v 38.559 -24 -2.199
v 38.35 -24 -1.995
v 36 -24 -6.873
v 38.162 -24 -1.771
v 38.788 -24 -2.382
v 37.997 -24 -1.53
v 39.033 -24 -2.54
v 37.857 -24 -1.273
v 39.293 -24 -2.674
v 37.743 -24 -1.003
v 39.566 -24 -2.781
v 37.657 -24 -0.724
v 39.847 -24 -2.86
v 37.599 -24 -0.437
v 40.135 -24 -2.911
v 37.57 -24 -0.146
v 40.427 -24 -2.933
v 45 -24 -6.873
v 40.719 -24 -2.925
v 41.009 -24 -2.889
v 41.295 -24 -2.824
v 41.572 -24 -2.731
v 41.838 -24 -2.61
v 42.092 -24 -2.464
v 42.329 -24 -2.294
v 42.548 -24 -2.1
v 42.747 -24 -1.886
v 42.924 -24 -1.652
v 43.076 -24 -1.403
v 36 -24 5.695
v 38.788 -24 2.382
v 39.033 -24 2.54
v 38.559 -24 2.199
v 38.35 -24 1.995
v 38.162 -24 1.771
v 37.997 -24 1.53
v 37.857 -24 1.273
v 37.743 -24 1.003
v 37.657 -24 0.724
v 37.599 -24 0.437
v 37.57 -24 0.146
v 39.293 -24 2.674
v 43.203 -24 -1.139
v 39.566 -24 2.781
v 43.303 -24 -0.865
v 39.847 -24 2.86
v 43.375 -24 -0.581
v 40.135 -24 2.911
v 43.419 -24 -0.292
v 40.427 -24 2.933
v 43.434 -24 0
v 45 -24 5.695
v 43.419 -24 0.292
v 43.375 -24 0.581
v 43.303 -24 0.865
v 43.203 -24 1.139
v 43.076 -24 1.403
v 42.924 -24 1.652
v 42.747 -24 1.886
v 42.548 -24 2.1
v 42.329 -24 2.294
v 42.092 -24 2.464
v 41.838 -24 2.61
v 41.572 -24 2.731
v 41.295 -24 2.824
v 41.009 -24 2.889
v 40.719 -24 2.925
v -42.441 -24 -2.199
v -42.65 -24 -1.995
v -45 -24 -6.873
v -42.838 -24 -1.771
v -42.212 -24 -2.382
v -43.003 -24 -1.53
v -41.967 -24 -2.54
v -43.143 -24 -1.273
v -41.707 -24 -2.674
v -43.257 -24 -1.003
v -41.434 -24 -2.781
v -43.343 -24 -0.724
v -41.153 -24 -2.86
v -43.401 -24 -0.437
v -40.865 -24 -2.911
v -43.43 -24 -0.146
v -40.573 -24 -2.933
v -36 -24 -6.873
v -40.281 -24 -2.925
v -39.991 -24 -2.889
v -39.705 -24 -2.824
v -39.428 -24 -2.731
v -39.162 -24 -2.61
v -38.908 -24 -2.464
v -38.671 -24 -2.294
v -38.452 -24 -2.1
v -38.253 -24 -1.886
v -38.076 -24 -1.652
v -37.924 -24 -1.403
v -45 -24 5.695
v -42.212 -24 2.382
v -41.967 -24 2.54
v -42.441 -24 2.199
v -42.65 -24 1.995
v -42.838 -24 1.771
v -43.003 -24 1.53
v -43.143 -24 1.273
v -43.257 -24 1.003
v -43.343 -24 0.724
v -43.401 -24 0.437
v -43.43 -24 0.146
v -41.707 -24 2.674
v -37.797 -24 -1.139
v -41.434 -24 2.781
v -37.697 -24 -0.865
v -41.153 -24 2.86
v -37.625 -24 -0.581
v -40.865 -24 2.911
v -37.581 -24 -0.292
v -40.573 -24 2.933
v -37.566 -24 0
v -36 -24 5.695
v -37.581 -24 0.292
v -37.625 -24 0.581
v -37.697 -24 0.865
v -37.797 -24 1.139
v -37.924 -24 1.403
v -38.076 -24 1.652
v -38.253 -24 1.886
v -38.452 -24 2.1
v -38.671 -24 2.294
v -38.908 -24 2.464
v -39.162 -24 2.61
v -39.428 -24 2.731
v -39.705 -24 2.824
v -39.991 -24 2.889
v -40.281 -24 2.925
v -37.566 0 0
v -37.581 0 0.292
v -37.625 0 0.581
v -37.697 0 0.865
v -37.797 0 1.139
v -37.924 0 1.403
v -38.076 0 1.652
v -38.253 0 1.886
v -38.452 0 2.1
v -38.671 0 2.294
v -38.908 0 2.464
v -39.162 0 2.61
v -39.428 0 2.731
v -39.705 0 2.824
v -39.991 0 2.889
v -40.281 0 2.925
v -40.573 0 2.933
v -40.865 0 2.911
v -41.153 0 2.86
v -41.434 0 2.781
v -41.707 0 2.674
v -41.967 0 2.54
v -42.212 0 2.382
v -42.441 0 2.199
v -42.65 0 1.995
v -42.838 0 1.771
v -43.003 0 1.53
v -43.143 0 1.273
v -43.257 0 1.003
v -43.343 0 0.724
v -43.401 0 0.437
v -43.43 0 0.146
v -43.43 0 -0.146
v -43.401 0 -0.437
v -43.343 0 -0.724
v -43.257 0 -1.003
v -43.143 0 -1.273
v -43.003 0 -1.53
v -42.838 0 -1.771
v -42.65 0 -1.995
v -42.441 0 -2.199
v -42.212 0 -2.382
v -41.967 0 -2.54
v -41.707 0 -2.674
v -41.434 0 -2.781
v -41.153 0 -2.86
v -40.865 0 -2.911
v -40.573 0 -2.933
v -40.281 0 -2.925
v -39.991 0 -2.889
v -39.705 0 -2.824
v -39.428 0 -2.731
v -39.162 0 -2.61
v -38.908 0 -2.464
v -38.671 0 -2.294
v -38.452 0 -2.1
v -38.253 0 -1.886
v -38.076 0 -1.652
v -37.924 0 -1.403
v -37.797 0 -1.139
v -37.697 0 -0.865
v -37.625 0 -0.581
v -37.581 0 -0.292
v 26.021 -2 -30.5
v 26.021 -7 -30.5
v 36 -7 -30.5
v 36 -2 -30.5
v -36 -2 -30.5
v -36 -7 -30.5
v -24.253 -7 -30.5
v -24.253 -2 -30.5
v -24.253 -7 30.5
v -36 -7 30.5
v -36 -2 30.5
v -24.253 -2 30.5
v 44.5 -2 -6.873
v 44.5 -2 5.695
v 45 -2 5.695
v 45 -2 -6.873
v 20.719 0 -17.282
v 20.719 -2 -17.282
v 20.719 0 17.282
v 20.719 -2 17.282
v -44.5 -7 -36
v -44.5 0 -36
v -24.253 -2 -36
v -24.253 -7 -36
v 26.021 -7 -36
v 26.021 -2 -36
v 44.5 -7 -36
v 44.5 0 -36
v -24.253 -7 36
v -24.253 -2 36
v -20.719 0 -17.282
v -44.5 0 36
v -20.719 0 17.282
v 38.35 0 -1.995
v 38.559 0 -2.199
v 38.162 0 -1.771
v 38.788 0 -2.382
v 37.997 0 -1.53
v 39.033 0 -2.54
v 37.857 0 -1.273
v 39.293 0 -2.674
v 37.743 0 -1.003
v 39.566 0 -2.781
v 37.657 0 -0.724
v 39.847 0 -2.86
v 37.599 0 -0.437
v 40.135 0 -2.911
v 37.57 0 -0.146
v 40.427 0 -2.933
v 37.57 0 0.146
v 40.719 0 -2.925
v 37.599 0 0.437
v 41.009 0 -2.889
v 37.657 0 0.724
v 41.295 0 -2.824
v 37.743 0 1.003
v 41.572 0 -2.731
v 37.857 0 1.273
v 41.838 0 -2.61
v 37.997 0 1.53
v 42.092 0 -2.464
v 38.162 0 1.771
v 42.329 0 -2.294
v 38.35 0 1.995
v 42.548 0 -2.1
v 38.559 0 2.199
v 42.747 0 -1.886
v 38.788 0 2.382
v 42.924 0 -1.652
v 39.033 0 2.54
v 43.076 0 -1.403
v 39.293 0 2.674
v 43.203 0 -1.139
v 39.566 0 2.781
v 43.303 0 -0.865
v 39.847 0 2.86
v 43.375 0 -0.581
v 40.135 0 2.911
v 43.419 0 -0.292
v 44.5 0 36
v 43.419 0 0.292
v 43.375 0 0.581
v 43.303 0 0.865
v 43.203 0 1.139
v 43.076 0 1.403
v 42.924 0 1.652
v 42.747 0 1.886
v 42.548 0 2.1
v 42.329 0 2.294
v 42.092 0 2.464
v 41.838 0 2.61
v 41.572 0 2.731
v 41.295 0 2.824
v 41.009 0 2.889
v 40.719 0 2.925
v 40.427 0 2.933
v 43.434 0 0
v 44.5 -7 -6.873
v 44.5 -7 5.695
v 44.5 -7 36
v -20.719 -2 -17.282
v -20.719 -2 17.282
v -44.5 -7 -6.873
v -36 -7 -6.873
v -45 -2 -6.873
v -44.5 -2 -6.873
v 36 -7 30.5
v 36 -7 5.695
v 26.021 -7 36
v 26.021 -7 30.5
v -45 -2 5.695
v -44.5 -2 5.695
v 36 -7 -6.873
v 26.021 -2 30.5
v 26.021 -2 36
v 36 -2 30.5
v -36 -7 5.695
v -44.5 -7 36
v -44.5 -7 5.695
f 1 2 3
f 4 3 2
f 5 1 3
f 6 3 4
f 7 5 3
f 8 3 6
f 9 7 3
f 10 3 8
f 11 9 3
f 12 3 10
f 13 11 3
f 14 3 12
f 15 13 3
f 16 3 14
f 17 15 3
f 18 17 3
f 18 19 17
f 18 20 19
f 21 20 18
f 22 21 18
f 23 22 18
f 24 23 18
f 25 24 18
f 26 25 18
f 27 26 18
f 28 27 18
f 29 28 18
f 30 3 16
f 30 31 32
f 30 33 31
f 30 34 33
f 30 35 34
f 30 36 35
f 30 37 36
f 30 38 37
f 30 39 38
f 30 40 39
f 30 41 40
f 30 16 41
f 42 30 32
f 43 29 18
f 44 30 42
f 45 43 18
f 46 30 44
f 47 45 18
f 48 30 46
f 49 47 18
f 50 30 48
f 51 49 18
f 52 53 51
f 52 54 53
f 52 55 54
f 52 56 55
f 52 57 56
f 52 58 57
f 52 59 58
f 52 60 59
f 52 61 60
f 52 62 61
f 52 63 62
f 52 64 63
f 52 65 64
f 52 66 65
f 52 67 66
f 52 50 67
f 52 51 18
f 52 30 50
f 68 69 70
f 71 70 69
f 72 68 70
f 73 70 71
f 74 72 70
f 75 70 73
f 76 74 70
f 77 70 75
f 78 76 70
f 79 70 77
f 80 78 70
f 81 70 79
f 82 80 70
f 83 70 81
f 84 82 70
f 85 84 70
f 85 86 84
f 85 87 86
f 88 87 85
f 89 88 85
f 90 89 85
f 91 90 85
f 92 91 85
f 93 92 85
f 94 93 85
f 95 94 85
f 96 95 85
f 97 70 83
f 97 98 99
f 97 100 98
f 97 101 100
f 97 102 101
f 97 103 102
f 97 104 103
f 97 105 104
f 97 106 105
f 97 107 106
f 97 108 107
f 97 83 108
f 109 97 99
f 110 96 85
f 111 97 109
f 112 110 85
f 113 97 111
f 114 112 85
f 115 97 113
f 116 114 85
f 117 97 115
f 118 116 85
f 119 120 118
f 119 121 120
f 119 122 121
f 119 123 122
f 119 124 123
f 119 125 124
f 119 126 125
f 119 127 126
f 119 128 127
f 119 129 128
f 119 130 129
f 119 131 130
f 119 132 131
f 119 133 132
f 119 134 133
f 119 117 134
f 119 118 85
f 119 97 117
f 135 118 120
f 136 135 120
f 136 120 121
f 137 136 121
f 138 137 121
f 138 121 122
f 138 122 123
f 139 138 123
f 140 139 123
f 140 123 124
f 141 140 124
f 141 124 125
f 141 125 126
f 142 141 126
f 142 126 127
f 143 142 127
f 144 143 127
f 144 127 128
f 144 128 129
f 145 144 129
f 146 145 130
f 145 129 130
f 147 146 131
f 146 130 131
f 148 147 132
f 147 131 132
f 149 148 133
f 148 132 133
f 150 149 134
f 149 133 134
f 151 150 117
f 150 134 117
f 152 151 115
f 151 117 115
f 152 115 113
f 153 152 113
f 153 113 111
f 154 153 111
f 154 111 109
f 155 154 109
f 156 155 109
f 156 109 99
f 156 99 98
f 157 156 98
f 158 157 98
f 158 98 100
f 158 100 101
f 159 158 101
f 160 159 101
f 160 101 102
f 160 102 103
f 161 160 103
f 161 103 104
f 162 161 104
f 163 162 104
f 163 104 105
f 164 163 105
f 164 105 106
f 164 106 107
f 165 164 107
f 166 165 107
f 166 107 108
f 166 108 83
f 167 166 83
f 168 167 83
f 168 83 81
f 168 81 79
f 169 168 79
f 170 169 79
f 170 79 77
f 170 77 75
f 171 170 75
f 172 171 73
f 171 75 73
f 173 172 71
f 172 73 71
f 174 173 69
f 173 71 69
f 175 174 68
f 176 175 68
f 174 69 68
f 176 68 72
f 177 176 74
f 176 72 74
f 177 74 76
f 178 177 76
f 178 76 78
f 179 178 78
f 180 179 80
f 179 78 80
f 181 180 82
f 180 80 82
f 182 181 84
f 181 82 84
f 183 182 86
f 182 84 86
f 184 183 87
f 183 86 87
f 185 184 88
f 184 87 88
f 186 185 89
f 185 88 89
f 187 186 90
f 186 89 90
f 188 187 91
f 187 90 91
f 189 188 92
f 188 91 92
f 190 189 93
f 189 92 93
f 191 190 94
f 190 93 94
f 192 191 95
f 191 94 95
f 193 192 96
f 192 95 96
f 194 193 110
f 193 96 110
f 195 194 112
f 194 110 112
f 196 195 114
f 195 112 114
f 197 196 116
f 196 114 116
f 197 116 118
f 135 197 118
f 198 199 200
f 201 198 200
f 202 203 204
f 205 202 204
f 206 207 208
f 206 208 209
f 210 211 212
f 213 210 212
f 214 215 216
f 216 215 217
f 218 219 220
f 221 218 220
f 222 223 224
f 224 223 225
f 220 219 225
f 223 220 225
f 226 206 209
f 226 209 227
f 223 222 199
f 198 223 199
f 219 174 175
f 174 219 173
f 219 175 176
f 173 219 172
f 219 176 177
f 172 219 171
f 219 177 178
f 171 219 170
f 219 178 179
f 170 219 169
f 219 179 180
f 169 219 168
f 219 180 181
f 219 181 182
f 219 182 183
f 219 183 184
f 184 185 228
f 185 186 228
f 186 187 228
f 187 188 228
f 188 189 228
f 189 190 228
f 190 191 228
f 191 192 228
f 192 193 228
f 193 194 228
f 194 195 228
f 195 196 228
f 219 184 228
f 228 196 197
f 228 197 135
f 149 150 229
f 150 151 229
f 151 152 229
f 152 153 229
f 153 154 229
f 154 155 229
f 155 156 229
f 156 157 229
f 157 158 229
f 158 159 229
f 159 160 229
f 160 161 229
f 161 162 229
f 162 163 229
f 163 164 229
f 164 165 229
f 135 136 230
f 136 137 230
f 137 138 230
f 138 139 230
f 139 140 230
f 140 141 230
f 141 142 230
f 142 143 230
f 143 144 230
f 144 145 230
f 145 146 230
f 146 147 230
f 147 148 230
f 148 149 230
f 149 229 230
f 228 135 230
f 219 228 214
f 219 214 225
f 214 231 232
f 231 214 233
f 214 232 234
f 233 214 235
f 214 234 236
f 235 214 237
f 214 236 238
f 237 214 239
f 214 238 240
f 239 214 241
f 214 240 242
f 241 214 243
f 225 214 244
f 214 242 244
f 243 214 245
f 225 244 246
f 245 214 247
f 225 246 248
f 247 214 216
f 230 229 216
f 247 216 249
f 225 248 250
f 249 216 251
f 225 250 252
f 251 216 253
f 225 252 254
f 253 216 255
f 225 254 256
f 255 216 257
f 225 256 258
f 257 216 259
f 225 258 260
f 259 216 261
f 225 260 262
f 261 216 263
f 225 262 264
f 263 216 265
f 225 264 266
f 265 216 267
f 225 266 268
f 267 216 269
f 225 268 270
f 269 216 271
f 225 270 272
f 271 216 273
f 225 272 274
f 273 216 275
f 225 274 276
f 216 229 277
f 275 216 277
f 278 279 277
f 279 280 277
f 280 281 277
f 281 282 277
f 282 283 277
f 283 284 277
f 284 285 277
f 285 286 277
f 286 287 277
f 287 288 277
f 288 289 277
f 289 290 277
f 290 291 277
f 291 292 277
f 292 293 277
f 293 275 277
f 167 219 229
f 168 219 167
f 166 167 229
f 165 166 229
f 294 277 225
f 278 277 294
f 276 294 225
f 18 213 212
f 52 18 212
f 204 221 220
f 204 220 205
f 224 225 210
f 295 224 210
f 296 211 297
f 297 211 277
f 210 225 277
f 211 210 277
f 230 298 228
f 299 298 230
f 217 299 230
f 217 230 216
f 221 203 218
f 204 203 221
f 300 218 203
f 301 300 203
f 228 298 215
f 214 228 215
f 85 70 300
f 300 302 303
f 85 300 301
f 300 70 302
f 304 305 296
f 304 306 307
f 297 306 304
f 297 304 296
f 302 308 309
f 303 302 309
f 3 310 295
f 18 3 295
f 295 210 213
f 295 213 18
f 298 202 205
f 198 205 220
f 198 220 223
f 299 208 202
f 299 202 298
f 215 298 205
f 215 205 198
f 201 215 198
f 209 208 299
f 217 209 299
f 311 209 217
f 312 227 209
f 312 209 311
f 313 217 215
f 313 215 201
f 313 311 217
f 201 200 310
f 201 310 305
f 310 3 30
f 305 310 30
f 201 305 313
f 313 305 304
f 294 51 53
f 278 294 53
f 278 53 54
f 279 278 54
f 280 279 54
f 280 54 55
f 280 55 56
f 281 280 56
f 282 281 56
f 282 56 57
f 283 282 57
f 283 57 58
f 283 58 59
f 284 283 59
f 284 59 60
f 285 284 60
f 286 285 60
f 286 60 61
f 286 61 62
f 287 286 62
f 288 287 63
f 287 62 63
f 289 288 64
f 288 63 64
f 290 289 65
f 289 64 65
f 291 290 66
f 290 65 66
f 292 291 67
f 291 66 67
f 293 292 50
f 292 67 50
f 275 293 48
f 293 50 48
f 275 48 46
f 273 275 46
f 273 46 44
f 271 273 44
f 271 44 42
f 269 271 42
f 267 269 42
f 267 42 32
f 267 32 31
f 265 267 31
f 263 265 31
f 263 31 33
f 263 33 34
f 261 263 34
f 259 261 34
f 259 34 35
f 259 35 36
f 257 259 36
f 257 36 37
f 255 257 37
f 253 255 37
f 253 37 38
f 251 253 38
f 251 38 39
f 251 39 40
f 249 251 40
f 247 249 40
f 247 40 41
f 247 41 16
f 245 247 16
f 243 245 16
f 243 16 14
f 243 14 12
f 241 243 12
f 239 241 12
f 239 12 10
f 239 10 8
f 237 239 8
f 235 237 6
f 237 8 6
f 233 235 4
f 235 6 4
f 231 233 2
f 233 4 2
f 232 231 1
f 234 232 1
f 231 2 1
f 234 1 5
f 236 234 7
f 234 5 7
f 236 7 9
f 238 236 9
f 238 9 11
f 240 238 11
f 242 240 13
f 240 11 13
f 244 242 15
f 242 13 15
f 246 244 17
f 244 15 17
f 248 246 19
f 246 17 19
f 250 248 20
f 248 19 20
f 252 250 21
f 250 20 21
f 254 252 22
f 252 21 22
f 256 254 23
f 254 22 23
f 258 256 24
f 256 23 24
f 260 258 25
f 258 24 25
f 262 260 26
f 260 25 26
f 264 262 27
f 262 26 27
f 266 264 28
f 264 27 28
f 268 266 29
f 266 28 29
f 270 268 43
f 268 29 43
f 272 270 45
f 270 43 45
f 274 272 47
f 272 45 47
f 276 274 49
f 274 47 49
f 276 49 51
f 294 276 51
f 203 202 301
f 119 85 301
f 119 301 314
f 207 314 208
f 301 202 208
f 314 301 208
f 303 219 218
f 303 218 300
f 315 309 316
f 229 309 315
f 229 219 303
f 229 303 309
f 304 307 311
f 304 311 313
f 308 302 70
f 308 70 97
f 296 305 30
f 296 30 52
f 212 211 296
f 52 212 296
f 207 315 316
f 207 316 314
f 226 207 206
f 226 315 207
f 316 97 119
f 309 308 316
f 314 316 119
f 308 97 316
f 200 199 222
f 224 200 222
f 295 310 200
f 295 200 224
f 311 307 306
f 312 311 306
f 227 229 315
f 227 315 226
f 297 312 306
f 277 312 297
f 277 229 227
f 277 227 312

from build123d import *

# Parameters (mm, degrees)
F0_W      = 89
F0_H      = 72
F1_DEPTH  = 7
F2_W      = 72
F2_H      = 61
F3_DEPTH  = 5
F4_W      = 41.437034
F4_H      = 34.563594
F5_DEPTH  = 25
F6_W      = 50.274316
F6_H      = 5.5
F7_DEPTH  = 5
F8_W      = 9
F8_H      = 12.568578
F9_DEPTH  = 22
F10_R     = 2.9335
F11_DEPTH = 25


with BuildPart() as f1:
    # F0 (on Front) → F1 (new body)
    with BuildSketch(Plane.XZ):
        Rectangle(F0_W, F0_H)
    extrude(amount=F1_DEPTH)

    # F2 (on face) → F3 (cut)
    with BuildSketch(Plane.XZ.offset(7)):
        Rectangle(F2_W, F2_H)
    extrude(amount=-F3_DEPTH, mode=Mode.SUBTRACT)

    # F4 (on face) → F5 (cut)
    with BuildSketch(Plane.XZ.offset(2)):
        Rectangle(F4_W, F4_H)
    extrude(amount=-F5_DEPTH, mode=Mode.SUBTRACT)

    # F6 (on face) → F7 (cut)
    with BuildSketch(Plane.XZ.offset(7)):
        with Locations((0.883728, -33.25)):
            Rectangle(F6_W, F6_H)
        with Locations((0.883728, 33.25)):
            Rectangle(F6_W, F6_H)
    extrude(amount=-F7_DEPTH, mode=Mode.SUBTRACT)

    # F8 (on face) → F9 (join)
    with BuildSketch(Plane.XZ.offset(2)):
        with Locations((-40.5, -0.589152)):
            Rectangle(F8_W, F8_H)
        with Locations((40.5, -0.589152)):
            Rectangle(F8_W, F8_H)
    extrude(amount=F9_DEPTH)

    # F10 (on face) → F11 (cut)
    with BuildSketch(Plane.XZ.offset(24)):
        with Locations((-40.5, 0)):
            Circle(F10_R)
        with Locations((40.5, 0)):
            Circle(F10_R)
    extrude(amount=-F11_DEPTH, mode=Mode.SUBTRACT)


solid = f1.part
